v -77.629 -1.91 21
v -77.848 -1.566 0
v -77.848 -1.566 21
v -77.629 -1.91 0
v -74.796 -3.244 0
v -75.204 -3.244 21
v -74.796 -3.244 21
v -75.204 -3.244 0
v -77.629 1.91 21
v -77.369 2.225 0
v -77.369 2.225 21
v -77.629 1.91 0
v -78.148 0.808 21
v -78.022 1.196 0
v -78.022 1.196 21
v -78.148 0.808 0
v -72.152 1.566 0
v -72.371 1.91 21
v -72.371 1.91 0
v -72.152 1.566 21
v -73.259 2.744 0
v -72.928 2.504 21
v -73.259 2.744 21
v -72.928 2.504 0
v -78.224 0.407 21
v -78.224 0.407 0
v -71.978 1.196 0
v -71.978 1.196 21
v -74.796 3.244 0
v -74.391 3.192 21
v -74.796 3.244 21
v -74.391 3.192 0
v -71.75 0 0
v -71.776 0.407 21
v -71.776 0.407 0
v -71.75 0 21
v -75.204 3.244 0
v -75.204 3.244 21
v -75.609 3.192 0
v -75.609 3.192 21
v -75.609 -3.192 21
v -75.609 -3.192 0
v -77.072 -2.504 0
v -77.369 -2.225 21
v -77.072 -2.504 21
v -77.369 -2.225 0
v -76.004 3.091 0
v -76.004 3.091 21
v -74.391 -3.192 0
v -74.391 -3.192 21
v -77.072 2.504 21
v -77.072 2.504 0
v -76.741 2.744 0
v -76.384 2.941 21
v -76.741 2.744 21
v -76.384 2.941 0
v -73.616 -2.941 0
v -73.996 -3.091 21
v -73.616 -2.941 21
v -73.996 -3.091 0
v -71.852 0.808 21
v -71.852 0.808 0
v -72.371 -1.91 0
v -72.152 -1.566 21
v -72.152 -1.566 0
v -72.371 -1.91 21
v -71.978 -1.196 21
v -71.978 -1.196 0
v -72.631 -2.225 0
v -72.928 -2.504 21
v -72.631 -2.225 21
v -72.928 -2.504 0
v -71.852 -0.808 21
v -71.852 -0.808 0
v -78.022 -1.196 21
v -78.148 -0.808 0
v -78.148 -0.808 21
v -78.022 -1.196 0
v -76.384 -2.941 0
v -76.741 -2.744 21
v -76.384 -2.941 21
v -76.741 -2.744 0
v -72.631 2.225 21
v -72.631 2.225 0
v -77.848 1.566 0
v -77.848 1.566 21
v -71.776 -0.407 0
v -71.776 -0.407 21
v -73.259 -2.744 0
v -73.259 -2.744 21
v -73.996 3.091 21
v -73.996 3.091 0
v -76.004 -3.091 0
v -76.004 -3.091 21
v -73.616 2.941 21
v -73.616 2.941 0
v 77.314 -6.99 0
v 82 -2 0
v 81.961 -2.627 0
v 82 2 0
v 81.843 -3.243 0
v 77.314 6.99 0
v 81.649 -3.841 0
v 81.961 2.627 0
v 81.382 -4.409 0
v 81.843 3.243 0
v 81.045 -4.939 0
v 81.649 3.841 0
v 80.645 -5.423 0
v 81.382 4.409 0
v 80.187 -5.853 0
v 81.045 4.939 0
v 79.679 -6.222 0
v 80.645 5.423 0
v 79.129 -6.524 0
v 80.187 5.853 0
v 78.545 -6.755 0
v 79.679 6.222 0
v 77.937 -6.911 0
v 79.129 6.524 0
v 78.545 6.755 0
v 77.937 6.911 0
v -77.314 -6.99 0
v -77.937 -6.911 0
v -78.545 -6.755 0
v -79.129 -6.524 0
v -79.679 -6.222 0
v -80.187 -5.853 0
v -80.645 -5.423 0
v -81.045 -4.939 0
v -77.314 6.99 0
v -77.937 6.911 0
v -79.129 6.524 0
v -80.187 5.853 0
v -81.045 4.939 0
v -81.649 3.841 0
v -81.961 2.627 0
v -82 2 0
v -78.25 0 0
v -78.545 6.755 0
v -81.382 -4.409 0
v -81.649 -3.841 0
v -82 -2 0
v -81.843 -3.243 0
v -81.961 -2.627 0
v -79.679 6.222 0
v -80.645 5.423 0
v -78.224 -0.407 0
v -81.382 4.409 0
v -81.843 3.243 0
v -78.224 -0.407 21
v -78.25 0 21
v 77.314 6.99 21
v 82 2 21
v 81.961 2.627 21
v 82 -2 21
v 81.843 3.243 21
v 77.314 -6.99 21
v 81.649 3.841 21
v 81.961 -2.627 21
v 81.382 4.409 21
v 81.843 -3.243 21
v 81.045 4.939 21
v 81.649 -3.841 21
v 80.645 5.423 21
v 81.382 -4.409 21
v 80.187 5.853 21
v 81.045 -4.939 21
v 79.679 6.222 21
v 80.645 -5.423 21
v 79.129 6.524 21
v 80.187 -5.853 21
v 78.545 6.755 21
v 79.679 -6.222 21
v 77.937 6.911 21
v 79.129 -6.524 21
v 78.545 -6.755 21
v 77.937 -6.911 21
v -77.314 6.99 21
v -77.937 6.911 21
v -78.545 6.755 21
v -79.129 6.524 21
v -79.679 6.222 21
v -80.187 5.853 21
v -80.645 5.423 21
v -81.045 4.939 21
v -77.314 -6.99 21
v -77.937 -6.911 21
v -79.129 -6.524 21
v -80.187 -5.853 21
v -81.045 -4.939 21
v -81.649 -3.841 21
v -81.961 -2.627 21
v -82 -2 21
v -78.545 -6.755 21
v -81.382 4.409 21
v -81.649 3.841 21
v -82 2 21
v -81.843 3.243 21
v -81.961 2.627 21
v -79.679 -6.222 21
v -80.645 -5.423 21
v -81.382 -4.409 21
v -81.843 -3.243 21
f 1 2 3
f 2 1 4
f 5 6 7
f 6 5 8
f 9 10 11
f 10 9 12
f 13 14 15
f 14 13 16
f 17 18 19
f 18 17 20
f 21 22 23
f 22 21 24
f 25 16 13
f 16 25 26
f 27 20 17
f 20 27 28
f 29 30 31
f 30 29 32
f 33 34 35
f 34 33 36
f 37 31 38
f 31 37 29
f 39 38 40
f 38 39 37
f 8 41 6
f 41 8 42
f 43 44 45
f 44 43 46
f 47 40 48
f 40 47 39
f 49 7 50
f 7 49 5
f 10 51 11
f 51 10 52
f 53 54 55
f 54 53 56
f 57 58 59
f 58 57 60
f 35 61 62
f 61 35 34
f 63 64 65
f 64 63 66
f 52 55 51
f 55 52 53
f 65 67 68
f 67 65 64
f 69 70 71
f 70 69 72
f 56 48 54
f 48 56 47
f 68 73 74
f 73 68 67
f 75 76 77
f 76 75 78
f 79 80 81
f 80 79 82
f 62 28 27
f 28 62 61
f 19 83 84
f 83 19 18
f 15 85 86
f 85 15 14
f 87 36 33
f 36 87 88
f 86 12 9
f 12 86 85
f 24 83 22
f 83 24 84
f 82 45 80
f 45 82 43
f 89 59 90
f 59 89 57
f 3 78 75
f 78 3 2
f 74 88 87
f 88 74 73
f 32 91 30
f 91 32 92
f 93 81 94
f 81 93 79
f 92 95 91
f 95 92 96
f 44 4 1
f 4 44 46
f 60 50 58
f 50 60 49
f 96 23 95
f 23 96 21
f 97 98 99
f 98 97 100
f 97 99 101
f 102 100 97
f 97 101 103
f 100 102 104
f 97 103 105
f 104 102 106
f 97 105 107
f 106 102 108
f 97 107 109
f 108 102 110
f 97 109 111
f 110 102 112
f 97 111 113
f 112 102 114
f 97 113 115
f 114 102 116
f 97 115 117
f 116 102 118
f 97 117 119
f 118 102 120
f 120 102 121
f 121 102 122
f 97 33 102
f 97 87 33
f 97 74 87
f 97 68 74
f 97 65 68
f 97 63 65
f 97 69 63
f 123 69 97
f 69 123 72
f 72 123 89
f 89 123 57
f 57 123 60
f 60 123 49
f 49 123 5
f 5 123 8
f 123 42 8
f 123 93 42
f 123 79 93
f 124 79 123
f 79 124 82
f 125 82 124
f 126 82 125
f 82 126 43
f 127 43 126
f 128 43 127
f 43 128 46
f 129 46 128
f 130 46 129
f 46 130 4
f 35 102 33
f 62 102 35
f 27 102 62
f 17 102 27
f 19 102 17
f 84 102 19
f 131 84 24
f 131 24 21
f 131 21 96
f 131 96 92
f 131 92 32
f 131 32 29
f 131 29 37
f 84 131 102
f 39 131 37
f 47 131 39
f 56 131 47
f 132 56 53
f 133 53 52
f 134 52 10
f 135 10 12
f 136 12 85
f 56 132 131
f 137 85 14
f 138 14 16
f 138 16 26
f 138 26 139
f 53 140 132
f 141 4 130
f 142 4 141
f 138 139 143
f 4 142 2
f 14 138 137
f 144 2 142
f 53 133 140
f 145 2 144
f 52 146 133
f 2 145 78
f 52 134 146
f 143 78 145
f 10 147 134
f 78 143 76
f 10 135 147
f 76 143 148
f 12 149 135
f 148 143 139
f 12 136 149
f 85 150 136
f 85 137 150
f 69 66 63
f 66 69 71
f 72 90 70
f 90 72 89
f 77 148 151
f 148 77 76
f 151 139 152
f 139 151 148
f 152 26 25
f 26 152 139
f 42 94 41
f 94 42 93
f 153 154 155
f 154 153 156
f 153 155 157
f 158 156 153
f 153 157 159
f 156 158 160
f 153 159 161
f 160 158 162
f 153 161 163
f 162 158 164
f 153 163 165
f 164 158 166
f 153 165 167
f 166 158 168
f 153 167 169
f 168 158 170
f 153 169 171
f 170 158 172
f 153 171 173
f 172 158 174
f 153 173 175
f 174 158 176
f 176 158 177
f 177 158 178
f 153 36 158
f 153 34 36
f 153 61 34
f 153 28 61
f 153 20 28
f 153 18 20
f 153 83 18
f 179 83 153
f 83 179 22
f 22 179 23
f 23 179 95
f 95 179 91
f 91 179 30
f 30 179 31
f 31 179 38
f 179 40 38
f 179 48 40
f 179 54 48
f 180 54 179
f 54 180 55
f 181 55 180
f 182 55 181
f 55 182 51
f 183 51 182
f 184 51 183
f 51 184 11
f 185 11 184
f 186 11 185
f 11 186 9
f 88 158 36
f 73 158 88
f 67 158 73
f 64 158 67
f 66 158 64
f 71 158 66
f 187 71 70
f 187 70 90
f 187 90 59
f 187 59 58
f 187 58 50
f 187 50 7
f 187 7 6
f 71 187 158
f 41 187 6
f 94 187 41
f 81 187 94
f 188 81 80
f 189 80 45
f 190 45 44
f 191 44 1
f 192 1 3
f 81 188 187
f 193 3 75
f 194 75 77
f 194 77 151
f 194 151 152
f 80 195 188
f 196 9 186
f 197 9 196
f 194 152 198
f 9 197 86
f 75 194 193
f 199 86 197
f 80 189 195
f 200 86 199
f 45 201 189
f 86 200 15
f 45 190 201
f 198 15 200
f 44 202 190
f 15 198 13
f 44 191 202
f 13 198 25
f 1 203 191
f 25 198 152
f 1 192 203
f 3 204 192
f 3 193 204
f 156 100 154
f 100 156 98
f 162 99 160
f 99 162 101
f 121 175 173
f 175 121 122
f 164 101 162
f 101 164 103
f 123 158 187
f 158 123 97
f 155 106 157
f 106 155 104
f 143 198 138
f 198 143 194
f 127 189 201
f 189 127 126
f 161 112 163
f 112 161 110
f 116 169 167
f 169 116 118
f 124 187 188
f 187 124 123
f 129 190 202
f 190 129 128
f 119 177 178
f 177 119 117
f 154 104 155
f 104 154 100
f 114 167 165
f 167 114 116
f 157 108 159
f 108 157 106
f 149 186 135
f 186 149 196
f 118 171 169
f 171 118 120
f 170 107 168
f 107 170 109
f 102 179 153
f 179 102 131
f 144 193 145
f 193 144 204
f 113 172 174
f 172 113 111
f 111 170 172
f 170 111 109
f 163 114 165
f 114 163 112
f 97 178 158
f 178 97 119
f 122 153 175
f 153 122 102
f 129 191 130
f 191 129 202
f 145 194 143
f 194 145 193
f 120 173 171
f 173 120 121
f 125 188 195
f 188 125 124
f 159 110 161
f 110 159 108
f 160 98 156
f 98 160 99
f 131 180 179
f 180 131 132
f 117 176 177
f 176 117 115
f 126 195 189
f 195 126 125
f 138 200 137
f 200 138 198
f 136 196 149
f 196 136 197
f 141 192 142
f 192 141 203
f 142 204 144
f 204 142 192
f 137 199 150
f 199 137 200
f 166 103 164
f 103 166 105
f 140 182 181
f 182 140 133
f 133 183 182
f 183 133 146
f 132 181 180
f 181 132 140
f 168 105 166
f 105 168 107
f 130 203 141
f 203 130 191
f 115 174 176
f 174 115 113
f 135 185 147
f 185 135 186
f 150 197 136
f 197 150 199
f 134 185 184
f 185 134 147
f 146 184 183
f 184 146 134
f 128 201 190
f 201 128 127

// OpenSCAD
$fn = 50;


difference() {
	union() {
		hull() {
			translate(v = [-77.0000000000, 2.0000000000, 0]) {
				cylinder(h = 21, r = 5);
			}
			translate(v = [77.0000000000, 2.0000000000, 0]) {
				cylinder(h = 21, r = 5);
			}
			translate(v = [-77.0000000000, -2.0000000000, 0]) {
				cylinder(h = 21, r = 5);
			}
			translate(v = [77.0000000000, -2.0000000000, 0]) {
				cylinder(h = 21, r = 5);
			}
		}
	}
	union() {
		translate(v = [-75.0000000000, 0.0000000000, 0]) {
			cylinder(h = 21, r = 3.2500000000);
		}
		translate(v = [-75.0000000000, 0.0000000000, 0]) {
			cylinder(h = 21, r = 1.8000000000);
		}
		translate(v = [-75.0000000000, 0.0000000000, 0]) {
			cylinder(h = 21, r = 1.8000000000);
		}
		translate(v = [-75.0000000000, 0.0000000000, 0]) {
			cylinder(h = 21, r = 1.8000000000);
		}
	}
}
